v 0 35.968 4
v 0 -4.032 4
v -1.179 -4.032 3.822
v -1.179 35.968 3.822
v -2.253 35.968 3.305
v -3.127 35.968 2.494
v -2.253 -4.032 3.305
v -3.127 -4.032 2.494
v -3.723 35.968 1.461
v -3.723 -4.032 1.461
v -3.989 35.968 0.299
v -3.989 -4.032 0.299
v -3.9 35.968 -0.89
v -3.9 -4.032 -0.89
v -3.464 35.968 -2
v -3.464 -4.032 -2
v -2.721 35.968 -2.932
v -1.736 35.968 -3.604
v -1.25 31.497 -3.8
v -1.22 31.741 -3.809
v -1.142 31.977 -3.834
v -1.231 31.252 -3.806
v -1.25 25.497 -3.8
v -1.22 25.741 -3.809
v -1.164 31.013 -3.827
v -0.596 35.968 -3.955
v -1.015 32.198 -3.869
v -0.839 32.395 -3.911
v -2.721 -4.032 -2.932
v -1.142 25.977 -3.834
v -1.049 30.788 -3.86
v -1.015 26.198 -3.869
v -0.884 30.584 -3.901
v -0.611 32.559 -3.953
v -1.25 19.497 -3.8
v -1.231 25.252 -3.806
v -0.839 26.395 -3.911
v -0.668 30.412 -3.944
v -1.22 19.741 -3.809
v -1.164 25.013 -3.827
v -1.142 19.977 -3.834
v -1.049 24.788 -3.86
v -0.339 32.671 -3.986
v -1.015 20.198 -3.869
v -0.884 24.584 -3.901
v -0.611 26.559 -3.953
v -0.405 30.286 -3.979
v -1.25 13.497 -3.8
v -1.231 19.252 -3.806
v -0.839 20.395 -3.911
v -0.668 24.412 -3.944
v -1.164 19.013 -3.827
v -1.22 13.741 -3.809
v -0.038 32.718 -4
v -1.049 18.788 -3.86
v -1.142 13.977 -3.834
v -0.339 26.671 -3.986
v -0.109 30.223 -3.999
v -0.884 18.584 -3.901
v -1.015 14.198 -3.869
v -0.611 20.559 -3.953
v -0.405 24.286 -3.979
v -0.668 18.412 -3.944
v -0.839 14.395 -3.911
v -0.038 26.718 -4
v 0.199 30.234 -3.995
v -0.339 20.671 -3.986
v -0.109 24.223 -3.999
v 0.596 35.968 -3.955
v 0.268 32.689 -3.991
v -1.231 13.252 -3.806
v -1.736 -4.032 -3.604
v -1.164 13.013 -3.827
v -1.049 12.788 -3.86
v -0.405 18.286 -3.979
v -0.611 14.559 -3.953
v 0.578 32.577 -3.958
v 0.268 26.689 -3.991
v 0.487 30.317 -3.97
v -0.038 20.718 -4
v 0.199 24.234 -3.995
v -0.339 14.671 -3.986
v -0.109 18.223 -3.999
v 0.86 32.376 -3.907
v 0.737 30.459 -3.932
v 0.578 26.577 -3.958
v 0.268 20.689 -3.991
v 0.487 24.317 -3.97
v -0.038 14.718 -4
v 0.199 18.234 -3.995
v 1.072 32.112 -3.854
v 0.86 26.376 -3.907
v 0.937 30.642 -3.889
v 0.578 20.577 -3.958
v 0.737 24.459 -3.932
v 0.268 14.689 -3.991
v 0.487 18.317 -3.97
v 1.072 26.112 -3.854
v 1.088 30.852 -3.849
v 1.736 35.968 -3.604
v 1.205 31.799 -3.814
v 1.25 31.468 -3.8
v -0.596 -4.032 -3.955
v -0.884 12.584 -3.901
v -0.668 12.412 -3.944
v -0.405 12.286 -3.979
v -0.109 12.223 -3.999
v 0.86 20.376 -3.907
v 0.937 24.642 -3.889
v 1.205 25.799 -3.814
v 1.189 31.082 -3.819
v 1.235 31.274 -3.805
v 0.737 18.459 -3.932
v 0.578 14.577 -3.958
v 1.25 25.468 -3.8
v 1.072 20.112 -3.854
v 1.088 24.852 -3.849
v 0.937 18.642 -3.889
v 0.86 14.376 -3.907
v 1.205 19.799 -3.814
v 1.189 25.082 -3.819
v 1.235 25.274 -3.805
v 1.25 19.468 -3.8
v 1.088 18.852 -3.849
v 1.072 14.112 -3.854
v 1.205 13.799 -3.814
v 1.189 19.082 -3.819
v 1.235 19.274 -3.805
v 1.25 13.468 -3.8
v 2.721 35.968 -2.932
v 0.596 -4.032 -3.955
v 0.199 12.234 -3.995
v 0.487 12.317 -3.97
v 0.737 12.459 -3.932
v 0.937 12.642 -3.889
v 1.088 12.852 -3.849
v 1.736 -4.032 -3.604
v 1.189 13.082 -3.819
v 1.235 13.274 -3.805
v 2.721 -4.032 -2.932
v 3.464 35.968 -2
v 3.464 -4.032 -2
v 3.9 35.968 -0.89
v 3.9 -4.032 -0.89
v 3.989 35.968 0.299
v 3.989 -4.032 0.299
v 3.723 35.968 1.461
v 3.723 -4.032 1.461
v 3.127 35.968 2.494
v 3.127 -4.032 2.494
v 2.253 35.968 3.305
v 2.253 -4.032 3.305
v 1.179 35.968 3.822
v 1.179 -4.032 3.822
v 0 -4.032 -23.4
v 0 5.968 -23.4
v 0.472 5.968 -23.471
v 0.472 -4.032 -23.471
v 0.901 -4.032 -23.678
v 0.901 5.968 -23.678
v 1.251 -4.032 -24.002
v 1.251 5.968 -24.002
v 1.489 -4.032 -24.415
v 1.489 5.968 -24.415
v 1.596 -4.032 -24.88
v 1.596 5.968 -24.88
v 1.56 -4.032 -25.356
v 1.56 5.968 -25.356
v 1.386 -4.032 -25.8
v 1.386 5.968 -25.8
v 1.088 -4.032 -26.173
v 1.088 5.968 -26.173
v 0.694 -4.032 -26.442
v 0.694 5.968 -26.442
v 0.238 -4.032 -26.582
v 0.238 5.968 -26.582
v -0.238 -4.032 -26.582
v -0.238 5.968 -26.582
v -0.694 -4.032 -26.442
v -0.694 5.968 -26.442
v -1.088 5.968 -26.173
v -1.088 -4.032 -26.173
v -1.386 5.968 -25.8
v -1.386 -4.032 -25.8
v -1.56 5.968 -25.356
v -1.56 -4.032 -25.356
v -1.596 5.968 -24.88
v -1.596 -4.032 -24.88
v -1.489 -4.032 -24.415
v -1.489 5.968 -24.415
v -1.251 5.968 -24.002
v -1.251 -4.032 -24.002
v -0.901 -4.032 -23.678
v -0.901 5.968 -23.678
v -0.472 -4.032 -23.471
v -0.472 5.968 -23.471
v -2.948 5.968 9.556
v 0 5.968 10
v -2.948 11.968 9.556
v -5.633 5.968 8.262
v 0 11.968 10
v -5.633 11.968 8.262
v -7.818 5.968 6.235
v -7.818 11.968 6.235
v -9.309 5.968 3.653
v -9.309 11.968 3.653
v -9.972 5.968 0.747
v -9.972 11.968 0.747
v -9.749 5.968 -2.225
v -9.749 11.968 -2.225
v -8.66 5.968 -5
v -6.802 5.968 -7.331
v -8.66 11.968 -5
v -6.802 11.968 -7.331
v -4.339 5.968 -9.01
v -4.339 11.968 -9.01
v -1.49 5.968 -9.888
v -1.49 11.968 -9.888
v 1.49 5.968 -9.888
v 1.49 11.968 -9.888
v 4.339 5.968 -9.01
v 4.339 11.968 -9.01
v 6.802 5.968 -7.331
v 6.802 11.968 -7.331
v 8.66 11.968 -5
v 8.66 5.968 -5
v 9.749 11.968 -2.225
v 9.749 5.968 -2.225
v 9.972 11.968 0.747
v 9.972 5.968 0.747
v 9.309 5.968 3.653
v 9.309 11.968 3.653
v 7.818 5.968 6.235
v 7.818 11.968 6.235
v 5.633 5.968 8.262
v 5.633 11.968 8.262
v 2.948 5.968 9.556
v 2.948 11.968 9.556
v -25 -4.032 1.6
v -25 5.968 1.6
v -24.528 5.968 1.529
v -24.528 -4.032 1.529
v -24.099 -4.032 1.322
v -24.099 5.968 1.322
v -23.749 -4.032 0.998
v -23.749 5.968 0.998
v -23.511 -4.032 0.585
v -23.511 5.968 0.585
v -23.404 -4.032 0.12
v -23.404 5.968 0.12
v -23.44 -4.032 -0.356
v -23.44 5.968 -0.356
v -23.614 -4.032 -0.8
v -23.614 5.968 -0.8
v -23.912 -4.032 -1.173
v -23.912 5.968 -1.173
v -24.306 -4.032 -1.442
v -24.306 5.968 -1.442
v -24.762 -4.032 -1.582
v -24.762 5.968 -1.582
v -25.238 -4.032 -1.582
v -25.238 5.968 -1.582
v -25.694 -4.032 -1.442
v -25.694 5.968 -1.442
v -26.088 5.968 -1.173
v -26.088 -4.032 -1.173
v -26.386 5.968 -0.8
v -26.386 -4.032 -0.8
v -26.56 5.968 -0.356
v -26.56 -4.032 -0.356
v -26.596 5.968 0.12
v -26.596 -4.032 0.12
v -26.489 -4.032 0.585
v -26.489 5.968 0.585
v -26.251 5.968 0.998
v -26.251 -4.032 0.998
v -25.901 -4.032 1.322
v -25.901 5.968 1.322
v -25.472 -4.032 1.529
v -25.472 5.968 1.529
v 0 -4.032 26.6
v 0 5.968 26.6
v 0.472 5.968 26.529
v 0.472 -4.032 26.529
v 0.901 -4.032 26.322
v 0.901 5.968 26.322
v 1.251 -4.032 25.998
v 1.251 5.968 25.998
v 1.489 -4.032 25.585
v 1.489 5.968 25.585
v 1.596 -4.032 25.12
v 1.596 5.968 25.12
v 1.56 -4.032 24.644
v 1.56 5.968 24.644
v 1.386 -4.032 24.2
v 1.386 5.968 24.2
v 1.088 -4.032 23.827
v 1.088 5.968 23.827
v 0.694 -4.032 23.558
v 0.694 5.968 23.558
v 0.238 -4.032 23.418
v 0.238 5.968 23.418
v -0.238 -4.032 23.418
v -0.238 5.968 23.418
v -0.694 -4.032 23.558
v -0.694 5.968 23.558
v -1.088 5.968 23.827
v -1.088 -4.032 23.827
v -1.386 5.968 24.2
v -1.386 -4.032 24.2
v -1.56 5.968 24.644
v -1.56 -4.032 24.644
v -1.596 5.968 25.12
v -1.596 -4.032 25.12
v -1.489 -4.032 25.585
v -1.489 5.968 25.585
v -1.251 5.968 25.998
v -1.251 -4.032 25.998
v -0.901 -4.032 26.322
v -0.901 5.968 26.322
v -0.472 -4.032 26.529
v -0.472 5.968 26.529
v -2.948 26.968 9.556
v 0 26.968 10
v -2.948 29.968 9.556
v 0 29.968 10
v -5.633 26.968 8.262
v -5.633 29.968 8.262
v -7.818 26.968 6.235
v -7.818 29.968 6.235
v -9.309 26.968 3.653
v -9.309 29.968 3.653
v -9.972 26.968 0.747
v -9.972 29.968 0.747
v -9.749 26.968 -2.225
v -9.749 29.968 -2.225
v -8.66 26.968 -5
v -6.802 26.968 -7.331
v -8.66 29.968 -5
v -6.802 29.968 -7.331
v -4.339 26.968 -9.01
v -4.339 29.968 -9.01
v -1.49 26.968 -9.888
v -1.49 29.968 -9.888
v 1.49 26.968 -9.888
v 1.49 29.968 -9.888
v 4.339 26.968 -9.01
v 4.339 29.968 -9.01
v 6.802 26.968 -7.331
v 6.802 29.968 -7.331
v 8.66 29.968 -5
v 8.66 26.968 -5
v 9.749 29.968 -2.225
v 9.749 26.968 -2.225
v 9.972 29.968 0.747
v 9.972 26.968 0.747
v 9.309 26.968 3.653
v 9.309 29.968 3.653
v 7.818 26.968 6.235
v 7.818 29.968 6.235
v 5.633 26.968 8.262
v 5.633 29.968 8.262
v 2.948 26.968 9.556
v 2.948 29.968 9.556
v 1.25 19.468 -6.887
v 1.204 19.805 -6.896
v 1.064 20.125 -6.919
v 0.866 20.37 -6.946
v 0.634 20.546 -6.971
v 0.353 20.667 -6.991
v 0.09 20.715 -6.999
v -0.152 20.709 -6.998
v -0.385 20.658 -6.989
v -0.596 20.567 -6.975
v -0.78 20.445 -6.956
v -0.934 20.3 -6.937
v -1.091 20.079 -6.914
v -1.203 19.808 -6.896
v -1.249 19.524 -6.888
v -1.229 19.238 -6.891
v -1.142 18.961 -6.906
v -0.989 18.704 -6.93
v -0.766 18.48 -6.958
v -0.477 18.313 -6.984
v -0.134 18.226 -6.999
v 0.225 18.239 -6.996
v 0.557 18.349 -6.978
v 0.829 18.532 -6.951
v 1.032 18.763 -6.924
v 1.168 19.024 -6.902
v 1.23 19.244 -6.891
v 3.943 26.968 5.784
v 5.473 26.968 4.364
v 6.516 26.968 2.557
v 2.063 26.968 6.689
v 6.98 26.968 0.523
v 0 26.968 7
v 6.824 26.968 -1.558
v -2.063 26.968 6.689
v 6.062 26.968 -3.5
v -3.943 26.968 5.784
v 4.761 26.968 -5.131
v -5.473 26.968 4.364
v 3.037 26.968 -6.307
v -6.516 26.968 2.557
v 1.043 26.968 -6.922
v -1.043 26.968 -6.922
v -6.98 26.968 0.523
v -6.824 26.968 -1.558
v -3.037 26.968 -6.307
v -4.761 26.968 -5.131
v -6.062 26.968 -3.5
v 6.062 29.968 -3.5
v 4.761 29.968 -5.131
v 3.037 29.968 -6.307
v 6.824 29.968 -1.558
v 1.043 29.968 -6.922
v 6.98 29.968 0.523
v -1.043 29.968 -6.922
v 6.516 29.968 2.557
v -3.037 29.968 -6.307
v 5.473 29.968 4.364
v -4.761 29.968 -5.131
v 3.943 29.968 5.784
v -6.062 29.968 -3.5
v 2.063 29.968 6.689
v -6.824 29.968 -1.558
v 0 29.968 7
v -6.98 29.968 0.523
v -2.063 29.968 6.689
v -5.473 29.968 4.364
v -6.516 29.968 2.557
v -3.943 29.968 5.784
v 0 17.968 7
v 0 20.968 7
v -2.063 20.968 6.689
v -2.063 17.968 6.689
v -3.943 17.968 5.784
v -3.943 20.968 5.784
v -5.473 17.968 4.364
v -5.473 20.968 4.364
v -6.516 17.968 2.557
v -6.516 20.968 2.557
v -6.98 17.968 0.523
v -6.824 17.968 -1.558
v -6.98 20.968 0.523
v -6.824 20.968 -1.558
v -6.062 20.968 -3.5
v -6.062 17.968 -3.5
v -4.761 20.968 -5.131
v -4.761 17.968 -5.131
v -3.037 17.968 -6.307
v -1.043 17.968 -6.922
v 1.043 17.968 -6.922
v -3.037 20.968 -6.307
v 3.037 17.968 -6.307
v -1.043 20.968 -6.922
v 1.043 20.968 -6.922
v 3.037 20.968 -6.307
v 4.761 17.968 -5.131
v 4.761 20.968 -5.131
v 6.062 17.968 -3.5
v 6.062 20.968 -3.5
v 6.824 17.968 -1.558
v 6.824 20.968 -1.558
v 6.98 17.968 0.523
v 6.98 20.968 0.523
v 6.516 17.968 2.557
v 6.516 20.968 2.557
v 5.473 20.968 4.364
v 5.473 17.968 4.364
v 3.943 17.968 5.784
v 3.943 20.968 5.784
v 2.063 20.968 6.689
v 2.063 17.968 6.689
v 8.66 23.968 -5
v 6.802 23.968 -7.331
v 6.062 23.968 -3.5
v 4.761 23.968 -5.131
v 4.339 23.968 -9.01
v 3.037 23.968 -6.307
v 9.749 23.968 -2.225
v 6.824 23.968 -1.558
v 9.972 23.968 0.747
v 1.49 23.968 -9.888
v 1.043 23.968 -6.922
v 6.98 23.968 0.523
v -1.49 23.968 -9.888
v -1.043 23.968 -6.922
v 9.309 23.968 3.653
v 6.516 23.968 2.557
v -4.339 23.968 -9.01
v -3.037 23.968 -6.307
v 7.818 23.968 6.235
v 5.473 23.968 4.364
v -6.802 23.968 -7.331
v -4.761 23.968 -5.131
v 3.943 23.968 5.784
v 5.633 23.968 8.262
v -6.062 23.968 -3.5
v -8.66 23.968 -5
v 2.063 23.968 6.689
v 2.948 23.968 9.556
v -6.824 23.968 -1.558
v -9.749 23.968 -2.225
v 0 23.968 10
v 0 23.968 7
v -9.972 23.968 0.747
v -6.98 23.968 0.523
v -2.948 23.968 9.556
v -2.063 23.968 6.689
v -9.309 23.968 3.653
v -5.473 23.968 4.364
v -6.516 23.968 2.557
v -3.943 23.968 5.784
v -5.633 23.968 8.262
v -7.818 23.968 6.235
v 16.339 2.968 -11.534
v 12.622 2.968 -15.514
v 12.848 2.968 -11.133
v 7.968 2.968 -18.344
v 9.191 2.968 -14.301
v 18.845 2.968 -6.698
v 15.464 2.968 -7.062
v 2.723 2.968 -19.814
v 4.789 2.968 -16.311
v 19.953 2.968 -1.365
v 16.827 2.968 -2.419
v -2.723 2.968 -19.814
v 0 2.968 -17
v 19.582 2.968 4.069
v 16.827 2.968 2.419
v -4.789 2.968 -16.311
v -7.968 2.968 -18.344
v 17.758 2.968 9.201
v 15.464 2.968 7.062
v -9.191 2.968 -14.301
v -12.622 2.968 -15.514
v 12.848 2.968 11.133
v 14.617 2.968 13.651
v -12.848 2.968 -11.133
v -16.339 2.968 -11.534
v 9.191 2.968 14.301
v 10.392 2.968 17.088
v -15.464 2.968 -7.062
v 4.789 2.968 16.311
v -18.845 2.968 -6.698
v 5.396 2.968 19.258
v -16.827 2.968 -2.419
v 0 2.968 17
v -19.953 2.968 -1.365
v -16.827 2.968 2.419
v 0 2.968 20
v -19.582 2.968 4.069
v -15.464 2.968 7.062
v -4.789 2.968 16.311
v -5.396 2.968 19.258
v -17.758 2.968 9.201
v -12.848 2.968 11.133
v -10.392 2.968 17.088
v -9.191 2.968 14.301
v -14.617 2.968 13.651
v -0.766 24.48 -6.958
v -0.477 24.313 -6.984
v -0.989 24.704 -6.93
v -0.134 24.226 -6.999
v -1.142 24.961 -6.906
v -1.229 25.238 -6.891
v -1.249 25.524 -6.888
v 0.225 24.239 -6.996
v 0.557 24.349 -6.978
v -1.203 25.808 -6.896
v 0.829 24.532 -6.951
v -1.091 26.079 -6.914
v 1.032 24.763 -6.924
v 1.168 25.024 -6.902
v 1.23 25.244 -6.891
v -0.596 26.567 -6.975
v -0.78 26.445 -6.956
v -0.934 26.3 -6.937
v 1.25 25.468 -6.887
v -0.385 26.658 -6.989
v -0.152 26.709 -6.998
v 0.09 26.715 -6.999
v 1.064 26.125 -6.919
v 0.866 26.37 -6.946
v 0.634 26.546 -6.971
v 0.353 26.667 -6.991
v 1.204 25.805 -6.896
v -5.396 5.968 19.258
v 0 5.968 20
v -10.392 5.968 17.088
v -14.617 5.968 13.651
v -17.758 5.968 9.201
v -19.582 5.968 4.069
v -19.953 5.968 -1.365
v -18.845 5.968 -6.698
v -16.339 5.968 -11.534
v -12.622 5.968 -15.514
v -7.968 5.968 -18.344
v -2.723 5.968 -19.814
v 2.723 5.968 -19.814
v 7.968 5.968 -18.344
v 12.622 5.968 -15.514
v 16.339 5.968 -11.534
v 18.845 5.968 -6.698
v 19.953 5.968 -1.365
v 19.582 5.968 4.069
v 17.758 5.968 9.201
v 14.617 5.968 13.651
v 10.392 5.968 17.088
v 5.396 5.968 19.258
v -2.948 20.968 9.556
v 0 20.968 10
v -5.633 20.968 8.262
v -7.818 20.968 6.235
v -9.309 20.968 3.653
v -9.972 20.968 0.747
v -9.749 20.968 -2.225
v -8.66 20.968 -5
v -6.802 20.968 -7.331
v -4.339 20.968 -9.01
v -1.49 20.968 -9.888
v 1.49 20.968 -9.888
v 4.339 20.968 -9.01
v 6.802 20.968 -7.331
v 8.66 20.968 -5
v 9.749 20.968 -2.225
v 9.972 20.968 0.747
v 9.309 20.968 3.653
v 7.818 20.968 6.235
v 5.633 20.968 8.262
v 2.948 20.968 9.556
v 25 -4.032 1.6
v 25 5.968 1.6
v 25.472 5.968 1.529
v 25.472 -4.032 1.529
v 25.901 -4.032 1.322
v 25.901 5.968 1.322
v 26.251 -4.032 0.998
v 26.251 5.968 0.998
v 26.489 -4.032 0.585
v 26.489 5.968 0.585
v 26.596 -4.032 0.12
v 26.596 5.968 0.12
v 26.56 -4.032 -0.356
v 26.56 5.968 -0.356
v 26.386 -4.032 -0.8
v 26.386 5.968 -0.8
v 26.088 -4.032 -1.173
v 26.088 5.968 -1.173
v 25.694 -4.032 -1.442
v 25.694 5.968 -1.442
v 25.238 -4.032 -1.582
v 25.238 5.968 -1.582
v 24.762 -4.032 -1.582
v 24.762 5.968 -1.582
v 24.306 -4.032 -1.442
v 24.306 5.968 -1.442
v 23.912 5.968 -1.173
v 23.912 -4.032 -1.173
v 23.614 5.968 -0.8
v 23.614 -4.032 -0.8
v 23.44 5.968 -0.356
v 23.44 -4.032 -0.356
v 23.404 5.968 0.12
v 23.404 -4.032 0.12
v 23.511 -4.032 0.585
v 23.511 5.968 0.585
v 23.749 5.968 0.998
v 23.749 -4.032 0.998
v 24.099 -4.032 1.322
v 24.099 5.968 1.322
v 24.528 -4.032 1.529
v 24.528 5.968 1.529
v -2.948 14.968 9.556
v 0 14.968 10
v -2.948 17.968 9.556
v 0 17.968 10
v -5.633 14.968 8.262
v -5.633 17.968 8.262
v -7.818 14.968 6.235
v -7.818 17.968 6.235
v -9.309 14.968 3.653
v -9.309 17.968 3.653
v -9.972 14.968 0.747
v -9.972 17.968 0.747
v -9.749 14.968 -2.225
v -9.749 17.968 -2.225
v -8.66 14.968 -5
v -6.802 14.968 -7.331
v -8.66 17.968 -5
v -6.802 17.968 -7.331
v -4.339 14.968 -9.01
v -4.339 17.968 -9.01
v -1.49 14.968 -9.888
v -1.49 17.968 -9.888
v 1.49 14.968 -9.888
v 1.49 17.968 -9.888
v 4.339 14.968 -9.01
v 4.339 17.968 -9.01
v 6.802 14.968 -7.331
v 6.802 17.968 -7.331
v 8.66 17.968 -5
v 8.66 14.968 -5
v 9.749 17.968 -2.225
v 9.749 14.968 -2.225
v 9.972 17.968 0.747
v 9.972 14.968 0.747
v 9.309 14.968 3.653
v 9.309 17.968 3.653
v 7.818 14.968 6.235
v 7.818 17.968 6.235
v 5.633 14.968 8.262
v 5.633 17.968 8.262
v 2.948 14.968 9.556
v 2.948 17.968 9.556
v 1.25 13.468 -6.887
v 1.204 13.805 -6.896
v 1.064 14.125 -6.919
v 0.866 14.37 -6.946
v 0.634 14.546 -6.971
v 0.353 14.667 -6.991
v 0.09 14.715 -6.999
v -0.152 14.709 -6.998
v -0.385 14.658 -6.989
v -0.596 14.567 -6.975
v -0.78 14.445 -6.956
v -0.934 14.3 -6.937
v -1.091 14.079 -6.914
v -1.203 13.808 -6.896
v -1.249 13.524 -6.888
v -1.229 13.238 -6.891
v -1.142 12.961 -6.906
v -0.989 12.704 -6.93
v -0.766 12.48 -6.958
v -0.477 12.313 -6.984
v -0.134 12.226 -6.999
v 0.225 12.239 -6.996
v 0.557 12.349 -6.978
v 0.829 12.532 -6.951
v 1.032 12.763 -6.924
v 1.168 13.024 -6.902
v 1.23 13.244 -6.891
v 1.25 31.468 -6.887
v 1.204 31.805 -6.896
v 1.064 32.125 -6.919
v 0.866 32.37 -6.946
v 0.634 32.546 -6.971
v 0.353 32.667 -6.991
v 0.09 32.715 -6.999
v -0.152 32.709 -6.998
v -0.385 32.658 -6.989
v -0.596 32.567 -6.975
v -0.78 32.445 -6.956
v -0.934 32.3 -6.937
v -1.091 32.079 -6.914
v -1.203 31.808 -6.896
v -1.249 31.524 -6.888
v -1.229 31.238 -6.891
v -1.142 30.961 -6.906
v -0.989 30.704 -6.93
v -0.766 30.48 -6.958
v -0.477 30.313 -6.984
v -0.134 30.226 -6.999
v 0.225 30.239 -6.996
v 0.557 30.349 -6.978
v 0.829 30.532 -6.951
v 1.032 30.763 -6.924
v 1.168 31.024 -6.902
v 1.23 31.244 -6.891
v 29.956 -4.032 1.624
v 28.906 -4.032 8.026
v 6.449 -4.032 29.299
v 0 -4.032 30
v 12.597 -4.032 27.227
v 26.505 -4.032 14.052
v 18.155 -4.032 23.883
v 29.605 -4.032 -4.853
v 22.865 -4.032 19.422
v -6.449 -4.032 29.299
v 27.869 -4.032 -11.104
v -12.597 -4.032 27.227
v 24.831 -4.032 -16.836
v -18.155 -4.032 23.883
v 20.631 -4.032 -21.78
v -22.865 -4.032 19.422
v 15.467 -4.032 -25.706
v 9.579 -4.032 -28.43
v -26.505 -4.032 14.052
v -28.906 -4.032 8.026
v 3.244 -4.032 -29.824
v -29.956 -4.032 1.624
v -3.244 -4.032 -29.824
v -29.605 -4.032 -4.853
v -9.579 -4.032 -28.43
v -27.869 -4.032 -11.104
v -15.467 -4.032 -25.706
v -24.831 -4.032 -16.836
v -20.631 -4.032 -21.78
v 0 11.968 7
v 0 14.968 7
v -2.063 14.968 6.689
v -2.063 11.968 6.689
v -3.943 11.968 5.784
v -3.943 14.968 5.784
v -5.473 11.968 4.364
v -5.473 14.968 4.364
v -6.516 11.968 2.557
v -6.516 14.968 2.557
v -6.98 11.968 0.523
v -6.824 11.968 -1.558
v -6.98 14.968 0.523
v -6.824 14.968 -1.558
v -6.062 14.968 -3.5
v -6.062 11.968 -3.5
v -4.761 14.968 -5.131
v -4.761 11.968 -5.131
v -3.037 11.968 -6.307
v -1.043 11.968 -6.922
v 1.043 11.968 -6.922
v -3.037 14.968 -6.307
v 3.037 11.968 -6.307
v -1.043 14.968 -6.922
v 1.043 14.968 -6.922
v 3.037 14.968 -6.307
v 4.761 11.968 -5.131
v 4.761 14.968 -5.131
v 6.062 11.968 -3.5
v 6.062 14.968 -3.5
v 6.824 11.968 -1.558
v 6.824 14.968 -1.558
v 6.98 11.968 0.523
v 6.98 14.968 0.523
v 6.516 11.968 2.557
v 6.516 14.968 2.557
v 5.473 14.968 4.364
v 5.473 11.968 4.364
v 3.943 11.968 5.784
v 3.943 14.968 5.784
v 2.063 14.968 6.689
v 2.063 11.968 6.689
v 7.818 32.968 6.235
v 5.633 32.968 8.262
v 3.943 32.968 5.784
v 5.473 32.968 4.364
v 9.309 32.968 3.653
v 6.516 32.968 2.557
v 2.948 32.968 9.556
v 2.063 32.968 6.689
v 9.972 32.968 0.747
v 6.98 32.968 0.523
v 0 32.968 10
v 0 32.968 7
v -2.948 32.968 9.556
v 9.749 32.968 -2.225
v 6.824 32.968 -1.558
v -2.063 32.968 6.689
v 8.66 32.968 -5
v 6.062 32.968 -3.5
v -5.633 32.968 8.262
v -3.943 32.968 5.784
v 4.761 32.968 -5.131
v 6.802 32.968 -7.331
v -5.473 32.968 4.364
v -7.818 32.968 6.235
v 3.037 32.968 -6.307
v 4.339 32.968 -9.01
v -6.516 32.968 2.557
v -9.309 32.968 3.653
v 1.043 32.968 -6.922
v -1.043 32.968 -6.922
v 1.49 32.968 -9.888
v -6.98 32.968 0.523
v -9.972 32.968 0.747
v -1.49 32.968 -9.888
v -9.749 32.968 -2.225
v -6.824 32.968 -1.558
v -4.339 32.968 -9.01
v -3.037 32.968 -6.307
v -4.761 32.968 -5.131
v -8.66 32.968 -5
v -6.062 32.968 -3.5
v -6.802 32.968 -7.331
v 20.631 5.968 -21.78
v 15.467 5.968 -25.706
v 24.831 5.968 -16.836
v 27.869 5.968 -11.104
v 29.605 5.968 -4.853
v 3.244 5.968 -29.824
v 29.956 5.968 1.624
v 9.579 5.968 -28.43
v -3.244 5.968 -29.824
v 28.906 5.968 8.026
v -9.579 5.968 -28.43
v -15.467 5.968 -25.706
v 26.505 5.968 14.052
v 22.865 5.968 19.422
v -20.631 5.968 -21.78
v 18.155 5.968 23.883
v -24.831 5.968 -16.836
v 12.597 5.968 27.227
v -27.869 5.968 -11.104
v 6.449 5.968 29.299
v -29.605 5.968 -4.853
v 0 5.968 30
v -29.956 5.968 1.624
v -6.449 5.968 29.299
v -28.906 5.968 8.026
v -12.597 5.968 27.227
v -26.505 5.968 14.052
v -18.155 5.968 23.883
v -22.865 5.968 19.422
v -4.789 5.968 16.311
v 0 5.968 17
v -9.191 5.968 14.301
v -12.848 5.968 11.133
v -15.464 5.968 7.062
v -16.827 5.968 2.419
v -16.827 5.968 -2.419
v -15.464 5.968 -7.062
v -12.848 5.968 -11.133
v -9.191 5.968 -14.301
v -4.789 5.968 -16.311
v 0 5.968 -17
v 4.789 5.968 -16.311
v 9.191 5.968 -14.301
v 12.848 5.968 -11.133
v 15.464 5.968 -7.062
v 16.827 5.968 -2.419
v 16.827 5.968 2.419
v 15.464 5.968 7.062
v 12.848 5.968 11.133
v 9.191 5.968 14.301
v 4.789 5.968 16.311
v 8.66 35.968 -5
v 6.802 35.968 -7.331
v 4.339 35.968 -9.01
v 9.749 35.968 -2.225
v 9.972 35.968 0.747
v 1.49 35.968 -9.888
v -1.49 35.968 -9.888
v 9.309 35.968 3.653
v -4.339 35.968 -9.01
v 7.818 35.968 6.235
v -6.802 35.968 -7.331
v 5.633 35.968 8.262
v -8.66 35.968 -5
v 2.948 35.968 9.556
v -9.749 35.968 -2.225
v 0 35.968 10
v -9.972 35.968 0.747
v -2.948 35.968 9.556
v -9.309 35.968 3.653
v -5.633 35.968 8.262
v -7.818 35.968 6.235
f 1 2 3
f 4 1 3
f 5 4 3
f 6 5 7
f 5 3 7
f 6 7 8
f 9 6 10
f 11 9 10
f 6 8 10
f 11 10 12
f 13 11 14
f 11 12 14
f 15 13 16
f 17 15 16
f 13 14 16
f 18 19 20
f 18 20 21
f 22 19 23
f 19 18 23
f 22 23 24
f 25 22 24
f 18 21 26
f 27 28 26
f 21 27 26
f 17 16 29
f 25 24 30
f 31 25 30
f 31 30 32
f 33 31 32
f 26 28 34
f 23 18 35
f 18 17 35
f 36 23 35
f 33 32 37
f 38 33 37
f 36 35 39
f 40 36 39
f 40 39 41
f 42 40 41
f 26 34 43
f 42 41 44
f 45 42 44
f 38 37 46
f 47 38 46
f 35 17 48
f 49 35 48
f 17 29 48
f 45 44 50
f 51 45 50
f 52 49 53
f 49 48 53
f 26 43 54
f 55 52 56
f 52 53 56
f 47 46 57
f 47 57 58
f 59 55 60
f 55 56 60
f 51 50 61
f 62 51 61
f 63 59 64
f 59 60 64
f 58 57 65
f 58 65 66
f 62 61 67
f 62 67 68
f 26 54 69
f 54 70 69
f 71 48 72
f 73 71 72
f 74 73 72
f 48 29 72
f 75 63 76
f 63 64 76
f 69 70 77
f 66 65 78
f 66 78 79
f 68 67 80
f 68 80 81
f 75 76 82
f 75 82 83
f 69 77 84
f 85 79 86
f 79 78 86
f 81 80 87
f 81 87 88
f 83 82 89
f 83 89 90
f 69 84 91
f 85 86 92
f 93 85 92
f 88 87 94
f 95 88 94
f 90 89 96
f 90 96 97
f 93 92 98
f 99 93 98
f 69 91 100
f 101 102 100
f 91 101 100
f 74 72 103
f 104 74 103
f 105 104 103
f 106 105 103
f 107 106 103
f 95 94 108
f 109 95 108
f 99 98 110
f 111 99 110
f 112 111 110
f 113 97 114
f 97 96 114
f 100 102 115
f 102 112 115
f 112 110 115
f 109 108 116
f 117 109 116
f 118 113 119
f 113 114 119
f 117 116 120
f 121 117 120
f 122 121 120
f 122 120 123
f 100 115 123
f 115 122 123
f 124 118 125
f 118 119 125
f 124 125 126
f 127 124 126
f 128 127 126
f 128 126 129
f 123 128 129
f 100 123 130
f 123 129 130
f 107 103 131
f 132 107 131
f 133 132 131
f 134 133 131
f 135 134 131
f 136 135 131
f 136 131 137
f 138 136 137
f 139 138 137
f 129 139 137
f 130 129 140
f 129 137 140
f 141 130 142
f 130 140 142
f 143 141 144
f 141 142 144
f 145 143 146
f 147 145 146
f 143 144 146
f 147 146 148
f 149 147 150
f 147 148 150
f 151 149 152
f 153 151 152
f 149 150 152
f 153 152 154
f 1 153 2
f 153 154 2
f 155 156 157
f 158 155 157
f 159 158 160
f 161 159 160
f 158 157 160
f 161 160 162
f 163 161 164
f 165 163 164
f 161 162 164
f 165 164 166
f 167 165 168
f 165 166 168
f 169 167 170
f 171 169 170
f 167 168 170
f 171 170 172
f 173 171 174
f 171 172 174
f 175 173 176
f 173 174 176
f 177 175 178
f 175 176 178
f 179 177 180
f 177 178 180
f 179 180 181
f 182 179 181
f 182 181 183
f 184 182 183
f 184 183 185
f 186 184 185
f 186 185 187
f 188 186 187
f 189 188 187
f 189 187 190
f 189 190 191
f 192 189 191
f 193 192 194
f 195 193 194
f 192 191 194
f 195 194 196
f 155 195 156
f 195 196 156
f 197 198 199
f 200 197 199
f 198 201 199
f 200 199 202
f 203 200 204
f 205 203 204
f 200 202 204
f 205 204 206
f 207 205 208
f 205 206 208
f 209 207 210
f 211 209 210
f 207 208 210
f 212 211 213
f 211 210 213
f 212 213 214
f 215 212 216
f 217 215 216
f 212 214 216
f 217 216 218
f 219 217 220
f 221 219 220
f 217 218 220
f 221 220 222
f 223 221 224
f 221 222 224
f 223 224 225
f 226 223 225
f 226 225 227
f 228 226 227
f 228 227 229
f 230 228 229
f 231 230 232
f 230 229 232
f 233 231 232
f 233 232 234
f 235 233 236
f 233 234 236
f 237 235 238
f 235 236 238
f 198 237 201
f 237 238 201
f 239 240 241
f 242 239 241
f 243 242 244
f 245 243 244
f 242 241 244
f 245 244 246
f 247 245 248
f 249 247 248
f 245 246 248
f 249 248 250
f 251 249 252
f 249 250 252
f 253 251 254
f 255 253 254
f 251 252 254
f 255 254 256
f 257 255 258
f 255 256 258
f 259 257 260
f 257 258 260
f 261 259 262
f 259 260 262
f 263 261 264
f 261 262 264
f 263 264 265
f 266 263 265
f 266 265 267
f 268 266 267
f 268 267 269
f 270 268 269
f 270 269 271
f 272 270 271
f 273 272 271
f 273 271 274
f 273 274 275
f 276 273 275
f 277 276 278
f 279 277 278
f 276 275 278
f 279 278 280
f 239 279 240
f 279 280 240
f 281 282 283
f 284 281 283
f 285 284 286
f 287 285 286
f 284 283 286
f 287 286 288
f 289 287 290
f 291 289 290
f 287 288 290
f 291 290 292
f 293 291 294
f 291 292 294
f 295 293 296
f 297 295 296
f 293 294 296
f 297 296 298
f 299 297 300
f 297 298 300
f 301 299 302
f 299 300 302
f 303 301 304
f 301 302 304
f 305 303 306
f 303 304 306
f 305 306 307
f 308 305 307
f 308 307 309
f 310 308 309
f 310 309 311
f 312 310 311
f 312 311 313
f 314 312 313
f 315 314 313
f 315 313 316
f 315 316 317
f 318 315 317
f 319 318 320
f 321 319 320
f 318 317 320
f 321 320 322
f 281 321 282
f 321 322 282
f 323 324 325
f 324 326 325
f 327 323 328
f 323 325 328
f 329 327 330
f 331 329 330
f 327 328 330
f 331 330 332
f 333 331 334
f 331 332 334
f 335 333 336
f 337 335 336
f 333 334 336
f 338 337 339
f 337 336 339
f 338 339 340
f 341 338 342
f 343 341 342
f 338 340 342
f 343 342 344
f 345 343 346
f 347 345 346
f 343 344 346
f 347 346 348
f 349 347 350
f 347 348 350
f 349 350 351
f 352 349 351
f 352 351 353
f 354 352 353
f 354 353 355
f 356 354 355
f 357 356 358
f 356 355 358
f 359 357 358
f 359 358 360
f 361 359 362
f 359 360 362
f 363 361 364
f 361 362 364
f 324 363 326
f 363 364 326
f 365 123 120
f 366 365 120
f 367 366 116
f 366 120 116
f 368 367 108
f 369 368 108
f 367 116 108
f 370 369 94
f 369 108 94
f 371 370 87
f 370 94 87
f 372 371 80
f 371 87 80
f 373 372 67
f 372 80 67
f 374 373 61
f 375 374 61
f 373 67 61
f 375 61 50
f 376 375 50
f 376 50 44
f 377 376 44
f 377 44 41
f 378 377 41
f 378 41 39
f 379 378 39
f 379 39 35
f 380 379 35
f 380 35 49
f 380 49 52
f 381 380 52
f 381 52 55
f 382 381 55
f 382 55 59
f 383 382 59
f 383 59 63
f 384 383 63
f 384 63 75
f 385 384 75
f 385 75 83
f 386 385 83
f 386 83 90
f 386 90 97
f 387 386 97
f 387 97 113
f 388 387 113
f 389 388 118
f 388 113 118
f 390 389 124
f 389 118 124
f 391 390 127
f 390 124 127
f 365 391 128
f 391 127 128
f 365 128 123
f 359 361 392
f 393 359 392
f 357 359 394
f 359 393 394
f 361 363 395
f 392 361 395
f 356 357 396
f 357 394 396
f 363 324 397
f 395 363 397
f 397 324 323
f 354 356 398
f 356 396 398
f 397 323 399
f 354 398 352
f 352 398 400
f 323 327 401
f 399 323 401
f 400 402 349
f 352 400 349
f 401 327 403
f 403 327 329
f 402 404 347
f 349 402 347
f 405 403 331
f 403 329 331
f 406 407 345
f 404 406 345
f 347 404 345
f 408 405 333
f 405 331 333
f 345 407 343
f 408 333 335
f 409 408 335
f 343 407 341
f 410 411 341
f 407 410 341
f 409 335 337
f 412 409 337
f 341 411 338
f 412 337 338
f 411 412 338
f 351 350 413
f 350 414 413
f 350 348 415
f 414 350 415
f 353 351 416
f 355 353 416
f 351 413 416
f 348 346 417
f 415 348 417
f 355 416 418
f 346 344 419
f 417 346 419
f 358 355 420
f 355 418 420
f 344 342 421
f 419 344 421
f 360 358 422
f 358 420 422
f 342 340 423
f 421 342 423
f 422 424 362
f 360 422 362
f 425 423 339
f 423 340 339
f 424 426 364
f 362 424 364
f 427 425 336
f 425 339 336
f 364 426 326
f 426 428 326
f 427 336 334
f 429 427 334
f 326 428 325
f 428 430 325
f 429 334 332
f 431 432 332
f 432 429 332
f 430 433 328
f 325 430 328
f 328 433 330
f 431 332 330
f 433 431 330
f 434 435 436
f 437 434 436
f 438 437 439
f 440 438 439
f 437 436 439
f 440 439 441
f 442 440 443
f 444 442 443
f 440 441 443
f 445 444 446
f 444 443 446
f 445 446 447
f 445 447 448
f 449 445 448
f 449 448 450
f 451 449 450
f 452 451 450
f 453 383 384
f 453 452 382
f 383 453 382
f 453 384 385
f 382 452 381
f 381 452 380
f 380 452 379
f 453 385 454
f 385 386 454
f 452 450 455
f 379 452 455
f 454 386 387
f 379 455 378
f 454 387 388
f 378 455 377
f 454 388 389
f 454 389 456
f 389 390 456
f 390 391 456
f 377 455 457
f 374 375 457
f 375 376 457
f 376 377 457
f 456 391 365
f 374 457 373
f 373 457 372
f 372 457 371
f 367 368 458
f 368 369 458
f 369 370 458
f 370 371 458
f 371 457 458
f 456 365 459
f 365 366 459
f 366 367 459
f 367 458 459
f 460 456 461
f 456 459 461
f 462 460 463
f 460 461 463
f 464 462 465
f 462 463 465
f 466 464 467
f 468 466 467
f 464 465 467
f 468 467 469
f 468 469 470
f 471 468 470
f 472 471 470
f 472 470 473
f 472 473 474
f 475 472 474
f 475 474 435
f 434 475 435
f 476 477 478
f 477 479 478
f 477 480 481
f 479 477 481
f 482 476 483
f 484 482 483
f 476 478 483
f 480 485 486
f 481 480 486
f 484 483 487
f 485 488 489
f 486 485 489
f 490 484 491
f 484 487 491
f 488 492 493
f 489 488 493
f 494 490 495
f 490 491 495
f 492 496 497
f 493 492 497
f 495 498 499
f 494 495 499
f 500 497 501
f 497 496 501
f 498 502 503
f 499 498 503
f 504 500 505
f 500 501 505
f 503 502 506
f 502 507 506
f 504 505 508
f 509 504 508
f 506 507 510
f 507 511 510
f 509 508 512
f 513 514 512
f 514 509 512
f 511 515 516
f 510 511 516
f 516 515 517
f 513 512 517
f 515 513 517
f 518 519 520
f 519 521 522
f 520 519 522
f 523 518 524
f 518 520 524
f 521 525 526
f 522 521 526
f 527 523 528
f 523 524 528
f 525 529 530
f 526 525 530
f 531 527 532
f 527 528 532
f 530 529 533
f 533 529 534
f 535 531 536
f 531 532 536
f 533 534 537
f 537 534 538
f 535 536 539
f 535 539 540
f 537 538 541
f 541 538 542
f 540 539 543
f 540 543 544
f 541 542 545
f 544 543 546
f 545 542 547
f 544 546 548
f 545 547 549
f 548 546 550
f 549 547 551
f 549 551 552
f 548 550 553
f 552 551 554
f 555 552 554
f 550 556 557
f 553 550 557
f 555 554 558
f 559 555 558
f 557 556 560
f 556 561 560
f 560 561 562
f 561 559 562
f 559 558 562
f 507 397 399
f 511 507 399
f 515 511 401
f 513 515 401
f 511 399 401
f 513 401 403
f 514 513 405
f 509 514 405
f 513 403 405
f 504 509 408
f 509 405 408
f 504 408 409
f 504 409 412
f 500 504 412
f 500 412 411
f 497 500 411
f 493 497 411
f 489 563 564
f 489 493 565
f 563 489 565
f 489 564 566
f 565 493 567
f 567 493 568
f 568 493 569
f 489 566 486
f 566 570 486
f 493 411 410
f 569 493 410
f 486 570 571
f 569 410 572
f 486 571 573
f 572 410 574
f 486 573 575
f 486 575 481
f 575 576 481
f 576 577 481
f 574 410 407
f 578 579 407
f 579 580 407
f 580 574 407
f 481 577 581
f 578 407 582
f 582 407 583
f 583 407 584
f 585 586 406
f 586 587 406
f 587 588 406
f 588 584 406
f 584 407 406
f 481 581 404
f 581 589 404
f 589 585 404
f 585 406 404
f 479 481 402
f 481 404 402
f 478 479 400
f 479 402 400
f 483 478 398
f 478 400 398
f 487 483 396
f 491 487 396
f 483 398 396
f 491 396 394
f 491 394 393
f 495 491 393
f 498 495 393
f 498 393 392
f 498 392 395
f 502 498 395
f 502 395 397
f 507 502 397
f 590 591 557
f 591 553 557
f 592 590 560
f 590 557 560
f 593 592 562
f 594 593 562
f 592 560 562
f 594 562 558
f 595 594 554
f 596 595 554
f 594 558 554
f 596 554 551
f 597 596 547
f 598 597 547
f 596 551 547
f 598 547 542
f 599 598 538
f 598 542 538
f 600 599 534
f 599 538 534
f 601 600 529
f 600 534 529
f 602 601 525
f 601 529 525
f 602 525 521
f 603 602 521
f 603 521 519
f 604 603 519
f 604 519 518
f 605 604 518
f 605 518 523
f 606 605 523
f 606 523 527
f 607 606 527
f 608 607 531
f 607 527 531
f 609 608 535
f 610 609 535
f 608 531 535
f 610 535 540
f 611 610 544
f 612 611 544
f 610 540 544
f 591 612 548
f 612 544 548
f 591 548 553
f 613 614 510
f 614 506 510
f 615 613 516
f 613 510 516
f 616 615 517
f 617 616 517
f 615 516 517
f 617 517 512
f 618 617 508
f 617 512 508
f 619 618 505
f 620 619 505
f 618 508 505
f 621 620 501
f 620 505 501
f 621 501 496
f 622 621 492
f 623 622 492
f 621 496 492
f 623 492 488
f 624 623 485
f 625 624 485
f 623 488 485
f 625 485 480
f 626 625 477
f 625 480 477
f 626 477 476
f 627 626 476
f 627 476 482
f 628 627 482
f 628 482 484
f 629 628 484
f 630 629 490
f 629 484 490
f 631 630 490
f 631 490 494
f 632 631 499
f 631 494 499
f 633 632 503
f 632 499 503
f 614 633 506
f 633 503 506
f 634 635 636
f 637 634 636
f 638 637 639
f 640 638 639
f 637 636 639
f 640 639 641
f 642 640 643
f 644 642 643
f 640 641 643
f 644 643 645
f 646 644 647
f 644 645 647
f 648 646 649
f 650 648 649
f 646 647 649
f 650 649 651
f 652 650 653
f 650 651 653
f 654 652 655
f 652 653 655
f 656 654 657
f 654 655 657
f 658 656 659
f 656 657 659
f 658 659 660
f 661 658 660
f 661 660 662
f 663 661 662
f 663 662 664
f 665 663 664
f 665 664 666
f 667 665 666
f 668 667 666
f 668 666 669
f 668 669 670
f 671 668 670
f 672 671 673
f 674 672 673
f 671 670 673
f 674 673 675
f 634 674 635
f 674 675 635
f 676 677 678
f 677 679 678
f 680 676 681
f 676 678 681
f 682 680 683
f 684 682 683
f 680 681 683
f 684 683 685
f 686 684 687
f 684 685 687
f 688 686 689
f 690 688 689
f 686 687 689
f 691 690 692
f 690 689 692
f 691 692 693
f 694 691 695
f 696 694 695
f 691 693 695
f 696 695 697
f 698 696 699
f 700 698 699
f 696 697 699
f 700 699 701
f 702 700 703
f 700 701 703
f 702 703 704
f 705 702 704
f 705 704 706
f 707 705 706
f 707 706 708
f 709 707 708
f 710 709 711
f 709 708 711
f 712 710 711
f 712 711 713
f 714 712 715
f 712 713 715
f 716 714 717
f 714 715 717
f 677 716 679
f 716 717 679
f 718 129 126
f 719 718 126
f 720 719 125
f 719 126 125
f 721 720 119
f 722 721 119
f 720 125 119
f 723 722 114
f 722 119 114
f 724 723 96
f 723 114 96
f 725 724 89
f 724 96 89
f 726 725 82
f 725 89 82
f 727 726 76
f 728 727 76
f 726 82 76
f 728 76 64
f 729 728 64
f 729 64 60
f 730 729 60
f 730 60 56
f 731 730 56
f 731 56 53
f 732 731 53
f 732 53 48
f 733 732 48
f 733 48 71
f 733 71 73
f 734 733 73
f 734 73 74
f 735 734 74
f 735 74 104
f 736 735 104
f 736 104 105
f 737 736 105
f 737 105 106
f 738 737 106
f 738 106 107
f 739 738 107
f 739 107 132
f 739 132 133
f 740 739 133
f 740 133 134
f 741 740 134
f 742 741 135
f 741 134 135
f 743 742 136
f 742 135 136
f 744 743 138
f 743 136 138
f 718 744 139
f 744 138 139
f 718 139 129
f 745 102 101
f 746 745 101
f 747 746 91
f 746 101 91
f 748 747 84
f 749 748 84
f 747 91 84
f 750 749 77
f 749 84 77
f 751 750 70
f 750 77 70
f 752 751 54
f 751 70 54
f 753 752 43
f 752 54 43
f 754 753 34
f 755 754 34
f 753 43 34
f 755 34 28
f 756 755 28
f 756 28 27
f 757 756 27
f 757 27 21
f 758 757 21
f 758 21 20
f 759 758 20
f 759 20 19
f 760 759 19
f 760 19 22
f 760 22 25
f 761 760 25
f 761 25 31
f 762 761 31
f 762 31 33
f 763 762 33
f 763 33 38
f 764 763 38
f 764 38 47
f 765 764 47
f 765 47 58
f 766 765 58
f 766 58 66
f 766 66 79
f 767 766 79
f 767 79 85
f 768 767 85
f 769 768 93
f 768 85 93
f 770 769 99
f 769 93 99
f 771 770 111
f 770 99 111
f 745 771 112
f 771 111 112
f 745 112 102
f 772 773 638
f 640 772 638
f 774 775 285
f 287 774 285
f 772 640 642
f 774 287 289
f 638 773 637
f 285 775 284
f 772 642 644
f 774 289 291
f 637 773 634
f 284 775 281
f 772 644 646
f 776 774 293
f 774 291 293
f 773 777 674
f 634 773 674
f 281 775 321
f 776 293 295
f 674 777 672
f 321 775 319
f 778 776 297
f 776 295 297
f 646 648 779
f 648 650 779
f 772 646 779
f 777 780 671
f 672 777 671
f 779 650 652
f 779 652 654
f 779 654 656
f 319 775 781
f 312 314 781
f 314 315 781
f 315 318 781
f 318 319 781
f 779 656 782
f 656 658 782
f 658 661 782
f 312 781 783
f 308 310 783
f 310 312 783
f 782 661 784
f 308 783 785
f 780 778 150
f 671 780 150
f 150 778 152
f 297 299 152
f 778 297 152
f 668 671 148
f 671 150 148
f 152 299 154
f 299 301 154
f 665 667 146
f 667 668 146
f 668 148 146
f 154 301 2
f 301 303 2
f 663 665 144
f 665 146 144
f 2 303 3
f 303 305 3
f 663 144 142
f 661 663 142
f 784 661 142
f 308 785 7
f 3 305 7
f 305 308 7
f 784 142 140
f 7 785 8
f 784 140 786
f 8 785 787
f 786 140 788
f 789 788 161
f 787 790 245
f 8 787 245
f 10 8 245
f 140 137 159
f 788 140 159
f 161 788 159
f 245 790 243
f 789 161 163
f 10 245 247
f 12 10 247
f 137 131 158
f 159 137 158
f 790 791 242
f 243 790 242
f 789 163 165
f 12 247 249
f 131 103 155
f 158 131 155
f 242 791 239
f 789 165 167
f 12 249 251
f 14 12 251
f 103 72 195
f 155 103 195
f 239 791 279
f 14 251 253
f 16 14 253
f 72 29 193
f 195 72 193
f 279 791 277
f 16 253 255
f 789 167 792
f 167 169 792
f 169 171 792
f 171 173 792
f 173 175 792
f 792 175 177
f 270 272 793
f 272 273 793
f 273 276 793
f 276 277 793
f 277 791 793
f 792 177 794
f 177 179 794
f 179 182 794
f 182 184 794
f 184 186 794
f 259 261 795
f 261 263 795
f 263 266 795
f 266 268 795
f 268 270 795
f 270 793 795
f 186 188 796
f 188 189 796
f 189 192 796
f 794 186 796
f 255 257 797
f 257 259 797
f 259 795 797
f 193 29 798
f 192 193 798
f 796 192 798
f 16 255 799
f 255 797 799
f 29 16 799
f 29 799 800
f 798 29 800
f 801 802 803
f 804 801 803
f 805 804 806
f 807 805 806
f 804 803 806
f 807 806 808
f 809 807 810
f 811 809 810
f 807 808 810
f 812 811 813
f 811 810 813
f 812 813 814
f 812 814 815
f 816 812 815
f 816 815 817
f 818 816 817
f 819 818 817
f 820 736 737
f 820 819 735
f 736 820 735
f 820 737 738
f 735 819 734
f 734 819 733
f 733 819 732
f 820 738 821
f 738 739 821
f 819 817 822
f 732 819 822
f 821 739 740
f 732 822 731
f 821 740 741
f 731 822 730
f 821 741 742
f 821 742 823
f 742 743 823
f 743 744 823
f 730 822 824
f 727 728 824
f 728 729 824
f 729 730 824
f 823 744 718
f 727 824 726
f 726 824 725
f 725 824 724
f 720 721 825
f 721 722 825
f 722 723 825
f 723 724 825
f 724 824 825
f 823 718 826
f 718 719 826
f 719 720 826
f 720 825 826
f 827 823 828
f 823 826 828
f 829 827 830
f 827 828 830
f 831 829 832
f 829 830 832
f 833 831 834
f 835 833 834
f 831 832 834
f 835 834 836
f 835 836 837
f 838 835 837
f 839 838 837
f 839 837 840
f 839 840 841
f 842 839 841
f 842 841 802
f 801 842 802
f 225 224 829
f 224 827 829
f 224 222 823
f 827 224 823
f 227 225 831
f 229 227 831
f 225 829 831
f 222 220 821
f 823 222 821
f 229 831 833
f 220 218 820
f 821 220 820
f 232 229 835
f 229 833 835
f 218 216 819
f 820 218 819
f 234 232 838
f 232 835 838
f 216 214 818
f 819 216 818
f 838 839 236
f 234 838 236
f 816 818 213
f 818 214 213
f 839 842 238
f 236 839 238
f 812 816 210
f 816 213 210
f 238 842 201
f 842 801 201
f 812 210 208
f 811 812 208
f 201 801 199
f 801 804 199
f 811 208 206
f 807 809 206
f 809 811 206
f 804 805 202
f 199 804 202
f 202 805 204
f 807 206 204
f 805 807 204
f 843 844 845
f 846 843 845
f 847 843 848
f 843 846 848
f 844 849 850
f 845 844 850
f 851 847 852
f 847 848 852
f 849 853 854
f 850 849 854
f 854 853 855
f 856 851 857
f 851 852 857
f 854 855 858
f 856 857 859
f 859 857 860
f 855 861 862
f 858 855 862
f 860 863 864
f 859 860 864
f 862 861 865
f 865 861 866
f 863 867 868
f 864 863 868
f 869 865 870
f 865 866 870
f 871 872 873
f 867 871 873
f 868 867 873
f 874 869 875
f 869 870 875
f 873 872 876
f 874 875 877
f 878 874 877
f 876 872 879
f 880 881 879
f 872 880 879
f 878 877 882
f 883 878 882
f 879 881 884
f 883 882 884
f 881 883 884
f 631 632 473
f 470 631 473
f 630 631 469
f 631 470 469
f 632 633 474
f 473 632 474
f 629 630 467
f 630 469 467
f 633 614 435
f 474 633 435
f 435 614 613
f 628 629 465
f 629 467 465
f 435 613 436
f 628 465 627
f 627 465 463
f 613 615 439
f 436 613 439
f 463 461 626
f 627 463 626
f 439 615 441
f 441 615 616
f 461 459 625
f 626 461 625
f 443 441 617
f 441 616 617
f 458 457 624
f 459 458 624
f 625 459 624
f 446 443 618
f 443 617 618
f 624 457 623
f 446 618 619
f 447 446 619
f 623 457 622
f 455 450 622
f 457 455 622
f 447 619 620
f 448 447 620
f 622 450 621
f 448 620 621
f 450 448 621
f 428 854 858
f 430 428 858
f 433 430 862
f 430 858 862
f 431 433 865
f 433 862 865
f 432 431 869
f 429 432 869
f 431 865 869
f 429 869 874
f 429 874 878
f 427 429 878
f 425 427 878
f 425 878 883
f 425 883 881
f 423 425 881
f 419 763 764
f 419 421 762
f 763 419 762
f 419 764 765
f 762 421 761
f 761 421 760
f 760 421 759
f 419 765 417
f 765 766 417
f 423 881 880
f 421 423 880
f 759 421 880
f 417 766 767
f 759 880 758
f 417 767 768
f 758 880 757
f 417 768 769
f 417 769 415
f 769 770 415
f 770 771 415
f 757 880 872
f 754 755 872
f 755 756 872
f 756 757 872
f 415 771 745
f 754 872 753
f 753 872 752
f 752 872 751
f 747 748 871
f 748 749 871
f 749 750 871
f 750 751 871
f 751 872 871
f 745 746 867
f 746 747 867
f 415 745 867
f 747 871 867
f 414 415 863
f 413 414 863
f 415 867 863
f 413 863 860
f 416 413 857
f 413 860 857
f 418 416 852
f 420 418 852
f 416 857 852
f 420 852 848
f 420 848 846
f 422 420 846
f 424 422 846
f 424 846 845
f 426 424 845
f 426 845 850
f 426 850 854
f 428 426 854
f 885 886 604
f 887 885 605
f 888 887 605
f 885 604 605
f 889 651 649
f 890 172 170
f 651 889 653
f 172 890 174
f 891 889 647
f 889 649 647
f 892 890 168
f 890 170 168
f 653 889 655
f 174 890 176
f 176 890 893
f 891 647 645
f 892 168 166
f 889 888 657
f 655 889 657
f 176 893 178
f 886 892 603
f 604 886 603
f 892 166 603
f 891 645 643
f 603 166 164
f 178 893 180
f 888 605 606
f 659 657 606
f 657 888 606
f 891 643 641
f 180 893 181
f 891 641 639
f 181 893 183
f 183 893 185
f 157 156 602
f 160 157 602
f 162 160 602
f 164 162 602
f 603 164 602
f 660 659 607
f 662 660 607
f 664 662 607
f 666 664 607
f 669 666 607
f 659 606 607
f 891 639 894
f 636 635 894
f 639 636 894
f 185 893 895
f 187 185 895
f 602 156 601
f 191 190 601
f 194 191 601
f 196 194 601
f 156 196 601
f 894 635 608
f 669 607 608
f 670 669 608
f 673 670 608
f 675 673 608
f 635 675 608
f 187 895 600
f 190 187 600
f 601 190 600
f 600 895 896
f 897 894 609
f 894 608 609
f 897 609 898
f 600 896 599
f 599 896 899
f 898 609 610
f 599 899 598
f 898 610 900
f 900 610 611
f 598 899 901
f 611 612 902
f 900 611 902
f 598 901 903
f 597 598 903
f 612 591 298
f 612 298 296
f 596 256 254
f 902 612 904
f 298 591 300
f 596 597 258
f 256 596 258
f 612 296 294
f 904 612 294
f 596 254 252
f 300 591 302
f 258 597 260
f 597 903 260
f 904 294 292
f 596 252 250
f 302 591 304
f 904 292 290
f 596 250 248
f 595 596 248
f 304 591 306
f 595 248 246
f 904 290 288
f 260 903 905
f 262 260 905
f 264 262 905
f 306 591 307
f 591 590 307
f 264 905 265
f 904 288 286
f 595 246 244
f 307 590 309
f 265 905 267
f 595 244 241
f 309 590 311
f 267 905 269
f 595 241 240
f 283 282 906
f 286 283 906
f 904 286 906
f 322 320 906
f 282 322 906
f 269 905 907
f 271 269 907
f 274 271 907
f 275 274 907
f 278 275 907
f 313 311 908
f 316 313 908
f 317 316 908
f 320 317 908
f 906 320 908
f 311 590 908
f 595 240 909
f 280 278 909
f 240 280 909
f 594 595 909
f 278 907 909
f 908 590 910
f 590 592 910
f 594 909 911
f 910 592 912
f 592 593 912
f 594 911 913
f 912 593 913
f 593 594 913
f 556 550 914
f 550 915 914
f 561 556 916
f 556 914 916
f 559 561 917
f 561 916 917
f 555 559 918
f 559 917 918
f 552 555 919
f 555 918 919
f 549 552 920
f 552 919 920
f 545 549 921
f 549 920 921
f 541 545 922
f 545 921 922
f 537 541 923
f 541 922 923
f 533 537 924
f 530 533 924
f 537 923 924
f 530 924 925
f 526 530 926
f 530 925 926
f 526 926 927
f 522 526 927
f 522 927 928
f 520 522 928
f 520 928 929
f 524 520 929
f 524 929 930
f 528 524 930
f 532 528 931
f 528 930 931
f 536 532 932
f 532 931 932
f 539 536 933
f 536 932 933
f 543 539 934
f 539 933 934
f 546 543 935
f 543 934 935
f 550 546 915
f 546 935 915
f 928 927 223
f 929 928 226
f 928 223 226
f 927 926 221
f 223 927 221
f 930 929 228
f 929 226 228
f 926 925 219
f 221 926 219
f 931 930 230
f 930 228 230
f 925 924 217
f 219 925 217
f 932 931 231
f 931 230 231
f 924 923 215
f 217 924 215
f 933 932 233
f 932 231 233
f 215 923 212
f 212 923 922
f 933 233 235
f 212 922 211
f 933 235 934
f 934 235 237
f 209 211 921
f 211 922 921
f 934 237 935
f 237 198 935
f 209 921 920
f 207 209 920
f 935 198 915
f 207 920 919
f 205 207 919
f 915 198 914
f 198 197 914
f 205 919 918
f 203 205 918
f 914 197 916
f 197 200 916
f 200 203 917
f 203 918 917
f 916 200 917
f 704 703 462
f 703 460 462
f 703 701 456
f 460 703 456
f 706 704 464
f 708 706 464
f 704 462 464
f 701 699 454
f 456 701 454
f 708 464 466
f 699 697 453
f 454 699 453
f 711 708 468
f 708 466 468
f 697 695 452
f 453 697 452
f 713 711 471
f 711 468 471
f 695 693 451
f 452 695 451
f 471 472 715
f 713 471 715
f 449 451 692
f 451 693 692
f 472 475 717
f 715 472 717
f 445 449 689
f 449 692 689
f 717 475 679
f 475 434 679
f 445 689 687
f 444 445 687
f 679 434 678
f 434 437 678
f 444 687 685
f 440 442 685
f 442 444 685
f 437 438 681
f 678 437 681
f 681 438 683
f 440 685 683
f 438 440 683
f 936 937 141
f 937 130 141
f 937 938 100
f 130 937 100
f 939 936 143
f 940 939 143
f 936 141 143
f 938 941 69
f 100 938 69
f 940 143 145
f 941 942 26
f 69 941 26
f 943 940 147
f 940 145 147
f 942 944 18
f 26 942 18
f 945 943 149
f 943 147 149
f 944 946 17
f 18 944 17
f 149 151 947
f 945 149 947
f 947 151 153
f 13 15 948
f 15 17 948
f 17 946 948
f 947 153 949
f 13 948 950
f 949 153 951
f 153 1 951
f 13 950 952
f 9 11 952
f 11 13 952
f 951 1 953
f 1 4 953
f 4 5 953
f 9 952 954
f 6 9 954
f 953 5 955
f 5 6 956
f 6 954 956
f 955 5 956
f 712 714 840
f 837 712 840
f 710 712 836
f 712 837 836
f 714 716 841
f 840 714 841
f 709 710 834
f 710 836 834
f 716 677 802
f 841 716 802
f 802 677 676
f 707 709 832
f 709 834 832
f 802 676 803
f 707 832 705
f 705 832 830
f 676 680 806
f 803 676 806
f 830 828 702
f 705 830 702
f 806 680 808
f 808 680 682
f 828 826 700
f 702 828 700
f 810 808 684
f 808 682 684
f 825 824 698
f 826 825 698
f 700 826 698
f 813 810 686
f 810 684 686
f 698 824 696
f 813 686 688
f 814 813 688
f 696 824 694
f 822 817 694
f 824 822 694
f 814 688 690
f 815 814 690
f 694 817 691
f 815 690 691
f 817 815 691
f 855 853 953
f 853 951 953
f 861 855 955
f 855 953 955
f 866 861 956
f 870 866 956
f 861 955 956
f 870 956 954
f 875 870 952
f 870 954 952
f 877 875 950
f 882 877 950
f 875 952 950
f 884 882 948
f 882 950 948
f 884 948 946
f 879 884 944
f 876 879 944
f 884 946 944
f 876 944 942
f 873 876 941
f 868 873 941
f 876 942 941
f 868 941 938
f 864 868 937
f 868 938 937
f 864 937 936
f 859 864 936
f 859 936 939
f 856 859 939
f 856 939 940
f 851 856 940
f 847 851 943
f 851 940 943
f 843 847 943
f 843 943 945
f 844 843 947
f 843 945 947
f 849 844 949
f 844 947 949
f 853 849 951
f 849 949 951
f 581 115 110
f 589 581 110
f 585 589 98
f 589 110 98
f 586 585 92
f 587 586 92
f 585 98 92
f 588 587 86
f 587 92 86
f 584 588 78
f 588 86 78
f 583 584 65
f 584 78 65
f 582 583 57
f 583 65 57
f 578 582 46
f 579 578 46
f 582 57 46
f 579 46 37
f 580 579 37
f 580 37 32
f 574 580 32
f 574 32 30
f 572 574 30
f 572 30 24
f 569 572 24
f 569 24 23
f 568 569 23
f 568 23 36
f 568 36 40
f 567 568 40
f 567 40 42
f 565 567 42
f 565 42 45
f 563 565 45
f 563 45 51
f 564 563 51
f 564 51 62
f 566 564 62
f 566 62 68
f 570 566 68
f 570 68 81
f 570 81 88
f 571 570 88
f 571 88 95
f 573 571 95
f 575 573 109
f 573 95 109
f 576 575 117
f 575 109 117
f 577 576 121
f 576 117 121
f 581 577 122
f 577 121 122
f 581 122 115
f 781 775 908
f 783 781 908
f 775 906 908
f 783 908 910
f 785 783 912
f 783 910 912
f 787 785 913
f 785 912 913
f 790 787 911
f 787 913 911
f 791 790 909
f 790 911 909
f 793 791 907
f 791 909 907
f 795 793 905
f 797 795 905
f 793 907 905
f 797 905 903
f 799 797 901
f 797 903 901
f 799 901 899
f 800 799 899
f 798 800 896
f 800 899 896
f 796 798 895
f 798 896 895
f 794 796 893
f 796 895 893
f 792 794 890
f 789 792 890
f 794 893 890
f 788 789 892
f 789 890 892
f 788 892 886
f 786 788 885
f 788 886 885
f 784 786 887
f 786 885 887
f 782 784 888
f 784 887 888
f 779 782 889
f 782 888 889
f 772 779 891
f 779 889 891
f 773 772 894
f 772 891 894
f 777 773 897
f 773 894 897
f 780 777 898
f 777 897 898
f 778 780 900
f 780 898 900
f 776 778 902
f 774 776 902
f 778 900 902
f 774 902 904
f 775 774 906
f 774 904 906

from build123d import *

# Parameters (mm, degrees)
SKETCH5_R          = 1.6
CUT_EXTRUDE2_DEPTH = 10
SKETCH8_R          = 1.25
CUT_EXTRUDE3_DEPTH = 10


with BuildPart() as part:
    # Sketch2 → Revolve1 (revolve)
    with BuildSketch(Plane.XY, mode=Mode.PRIVATE) as revolve1_sk:
        Polygon((4, 35.968329977), (4, -4.031670023), (30, -4.031670023), (30, 5.968329977), (20, 5.968329977), (20, 2.968329977), (17, 2.968329977), (17, 5.968329977), (10, 5.968329977), (10, 11.968329977), (7, 11.968329977), (7, 14.968329977), (10, 14.968329977), (10, 17.968329977), (7, 17.968329977), (7, 20.968329977), (10, 20.968329977), (10, 23.968329977), (7, 23.968329977), (7, 26.968329977), (10, 26.968329977), (10, 29.968329977), (7, 29.968329977), (7, 32.968329977), (10, 32.968329977), (10, 35.968329977), align=None)
    revolve(revolve1_sk.sketch.rotate(Axis((0, 37.555974624, 0), (0, -1, 0)), 90), axis=Axis((0, 37.555974624, 0), (0, -1, 0)))

    # Sketch5 → Cut-Extrude2 (cut)
    with BuildSketch(Plane(origin=(0, 5.968329977, 0), x_dir=(1, 0, 0), z_dir=(0, 1, 0))):
        with Locations(Location((-25, 0, 0), (0, 0, 270))):
            Circle(SKETCH5_R)
        with Locations(Location((0, 25, 0), (0, 0, 270))):
            Circle(SKETCH5_R)
        with Locations(Location((25, 0, 0), (0, 0, 270))):
            Circle(SKETCH5_R)
        with Locations(Location((0, -25, 0), (0, 0, 270))):
            Circle(SKETCH5_R)
    extrude(amount=-CUT_EXTRUDE2_DEPTH, mode=Mode.SUBTRACT)

    # Sketch8 → Cut-Extrude3 (cut)
    with BuildSketch(Plane.XY):
        with Locations((0, 31.468329977)):
            Circle(SKETCH8_R)
        with Locations((0, 25.468329977)):
            Circle(SKETCH8_R)
        with Locations((0, 19.468329977)):
            Circle(SKETCH8_R)
        with Locations((0, 13.468329977)):
            Circle(SKETCH8_R)
    extrude(amount=-CUT_EXTRUDE3_DEPTH, mode=Mode.SUBTRACT)


solid = part.part
